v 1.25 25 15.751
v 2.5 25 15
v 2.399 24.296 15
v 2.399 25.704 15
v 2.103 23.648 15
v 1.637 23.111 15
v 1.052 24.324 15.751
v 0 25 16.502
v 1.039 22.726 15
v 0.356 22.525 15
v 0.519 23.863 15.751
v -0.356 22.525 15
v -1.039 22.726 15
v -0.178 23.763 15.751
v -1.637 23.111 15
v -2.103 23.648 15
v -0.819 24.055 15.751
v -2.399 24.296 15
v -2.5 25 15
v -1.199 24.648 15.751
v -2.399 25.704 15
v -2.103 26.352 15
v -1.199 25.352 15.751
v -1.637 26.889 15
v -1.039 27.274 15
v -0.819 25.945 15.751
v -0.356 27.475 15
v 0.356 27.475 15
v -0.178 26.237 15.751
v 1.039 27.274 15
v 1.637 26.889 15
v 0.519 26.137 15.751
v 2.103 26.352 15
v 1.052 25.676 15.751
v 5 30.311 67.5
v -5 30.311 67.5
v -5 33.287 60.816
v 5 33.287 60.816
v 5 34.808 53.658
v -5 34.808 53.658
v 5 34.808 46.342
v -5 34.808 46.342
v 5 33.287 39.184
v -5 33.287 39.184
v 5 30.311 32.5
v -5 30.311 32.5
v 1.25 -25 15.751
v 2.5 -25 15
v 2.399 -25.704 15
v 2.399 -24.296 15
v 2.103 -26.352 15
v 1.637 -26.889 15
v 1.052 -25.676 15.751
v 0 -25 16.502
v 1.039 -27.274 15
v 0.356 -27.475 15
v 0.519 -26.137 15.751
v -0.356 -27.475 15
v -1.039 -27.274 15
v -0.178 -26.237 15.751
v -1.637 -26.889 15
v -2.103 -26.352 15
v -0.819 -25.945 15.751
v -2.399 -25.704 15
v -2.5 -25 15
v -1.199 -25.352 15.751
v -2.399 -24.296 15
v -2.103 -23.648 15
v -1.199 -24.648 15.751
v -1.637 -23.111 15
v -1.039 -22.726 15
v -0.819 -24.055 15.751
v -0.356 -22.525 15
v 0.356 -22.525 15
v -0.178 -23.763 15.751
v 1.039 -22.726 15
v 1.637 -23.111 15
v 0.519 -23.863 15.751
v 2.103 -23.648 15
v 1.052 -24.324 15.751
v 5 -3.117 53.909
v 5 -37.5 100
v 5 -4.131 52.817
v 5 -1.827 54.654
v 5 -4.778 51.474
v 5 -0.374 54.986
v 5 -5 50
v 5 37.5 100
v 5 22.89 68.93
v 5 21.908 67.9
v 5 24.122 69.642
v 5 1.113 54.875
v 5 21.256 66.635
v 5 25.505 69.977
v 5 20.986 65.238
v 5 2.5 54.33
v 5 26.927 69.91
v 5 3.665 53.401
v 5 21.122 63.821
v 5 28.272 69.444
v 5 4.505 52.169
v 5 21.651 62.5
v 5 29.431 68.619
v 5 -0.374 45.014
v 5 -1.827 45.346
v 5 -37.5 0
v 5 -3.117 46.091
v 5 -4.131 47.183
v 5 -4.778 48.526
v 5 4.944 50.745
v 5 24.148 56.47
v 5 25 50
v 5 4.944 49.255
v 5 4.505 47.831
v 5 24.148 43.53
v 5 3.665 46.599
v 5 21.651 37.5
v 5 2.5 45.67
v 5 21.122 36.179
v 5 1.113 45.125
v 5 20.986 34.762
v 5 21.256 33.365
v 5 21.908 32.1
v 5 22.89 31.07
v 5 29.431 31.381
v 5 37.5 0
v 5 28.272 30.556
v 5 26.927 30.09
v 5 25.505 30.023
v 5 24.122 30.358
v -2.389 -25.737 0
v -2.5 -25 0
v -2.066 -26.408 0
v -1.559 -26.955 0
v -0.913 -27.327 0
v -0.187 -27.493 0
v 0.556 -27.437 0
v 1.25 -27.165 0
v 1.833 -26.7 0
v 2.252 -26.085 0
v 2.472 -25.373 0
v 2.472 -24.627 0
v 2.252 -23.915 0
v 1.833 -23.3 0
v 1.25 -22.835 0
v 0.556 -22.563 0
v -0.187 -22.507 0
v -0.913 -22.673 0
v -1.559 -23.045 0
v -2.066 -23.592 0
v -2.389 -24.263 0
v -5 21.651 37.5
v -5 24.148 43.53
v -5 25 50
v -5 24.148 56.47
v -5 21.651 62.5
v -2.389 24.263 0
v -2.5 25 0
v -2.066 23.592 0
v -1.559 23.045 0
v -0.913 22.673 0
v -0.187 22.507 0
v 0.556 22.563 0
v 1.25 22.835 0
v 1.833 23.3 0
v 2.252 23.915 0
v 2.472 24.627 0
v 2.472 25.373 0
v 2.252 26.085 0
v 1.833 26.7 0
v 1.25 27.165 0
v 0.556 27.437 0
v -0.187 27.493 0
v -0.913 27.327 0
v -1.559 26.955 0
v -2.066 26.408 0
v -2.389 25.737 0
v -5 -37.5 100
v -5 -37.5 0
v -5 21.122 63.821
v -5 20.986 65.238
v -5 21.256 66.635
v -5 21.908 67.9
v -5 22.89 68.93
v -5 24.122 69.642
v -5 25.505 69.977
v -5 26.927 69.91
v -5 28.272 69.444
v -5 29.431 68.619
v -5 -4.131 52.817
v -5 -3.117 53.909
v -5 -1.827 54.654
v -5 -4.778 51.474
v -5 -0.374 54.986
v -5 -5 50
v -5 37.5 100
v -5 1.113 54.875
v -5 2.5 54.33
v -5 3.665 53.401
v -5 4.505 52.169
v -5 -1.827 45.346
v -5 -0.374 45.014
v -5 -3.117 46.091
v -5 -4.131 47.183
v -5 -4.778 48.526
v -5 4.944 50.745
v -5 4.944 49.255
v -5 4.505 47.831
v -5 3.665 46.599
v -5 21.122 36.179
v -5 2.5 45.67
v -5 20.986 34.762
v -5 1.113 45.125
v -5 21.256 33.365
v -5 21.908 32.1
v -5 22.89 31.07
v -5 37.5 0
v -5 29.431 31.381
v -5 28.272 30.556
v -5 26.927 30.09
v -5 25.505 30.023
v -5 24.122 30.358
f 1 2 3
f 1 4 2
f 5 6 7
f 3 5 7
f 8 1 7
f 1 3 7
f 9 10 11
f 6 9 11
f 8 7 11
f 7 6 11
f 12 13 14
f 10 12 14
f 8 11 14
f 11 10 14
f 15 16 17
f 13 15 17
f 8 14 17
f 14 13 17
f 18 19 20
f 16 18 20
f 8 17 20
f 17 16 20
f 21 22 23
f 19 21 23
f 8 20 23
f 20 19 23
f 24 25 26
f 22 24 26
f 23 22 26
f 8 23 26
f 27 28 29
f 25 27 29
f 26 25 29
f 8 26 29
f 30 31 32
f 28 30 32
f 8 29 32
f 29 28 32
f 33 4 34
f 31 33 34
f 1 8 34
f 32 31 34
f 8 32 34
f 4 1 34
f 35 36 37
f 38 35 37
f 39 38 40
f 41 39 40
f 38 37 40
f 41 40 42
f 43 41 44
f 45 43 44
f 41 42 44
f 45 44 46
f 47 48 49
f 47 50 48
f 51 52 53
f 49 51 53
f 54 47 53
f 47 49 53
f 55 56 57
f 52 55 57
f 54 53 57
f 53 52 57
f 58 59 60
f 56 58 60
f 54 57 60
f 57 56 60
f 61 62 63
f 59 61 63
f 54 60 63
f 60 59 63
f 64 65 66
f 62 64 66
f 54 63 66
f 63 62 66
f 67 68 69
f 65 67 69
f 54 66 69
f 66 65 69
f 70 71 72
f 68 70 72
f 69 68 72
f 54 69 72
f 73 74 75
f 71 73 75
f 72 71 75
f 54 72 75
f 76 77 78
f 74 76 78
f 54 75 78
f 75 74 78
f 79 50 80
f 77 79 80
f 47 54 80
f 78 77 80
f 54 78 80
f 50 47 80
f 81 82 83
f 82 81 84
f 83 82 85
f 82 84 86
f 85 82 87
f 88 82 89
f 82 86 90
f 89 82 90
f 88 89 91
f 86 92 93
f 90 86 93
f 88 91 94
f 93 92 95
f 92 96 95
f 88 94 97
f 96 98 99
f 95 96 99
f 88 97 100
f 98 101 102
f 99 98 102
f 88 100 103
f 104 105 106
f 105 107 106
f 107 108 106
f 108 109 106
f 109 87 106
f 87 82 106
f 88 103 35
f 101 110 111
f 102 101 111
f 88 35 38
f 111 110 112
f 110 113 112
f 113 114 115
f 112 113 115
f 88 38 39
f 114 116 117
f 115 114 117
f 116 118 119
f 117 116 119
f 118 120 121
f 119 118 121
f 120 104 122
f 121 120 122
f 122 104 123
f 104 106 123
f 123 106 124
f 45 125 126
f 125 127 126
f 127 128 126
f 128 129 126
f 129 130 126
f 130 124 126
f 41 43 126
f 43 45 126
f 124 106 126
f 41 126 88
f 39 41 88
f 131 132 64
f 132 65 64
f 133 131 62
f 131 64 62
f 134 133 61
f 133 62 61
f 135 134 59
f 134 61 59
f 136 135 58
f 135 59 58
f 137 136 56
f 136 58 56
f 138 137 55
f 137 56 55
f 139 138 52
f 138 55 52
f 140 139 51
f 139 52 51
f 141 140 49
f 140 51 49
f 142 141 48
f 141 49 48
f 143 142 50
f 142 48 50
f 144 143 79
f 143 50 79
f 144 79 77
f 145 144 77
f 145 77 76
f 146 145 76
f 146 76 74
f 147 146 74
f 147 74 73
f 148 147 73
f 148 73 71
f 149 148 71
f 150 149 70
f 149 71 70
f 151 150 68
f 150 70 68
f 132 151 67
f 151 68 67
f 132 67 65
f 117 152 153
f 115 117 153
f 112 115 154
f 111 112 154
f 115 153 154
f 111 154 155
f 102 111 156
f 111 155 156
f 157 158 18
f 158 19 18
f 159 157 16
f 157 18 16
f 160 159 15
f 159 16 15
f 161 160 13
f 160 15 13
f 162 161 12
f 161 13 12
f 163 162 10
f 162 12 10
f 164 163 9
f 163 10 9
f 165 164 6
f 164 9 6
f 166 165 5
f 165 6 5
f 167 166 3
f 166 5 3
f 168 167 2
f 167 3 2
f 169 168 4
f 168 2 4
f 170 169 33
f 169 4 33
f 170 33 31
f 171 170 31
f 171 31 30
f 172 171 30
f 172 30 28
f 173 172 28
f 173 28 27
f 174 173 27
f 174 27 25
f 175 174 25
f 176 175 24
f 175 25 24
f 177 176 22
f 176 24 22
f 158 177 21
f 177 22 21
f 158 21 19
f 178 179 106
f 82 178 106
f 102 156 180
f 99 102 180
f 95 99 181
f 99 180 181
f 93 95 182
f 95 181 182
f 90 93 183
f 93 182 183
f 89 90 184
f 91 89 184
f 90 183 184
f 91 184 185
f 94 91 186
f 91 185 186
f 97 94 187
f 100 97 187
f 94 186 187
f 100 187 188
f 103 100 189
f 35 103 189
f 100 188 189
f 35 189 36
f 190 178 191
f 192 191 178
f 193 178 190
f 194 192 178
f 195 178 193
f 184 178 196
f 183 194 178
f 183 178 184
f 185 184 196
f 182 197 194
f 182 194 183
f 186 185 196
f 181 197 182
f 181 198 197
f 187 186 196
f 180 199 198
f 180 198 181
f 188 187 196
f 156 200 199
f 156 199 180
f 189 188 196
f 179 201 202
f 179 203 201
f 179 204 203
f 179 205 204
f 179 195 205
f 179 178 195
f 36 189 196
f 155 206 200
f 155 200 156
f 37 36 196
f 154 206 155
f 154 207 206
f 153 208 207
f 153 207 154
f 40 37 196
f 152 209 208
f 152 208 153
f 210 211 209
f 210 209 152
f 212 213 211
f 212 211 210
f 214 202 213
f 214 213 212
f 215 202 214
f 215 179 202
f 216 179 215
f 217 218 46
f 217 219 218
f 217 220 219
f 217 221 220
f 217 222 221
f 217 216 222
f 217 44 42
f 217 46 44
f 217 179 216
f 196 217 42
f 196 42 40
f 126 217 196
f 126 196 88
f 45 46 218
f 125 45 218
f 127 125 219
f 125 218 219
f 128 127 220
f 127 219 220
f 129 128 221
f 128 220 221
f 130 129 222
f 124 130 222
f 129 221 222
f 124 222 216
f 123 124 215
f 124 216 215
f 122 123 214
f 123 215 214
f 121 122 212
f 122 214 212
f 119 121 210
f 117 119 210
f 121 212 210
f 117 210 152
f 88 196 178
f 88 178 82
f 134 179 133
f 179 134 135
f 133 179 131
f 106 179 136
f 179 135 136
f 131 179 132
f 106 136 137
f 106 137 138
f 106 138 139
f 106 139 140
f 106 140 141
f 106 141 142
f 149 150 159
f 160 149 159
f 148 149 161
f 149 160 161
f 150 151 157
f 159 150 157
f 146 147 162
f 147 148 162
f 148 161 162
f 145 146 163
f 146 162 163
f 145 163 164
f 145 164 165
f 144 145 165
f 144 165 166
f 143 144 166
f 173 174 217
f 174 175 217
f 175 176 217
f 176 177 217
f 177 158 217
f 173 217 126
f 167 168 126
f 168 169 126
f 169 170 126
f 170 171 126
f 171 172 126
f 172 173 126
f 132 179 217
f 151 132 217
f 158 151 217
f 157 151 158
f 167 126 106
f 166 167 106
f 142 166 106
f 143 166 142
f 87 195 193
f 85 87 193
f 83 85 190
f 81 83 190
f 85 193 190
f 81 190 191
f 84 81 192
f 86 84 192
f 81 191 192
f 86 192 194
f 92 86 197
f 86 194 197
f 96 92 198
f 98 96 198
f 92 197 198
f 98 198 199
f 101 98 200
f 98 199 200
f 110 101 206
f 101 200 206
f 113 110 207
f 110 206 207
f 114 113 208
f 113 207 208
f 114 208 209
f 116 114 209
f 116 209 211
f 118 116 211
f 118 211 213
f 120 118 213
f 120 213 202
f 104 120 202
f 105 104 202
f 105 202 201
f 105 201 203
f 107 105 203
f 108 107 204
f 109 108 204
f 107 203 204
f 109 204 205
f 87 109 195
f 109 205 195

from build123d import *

# Parameters (mm, degrees)
F0_W     = 10
F0_H     = 75
F1_DEPTH = 100
F3_D     = 5
F3_DEPTH = 15
F3_TIP   = 1.5021515476
F4_R     = 5
F5_DEPTH = 10
F7_DEPTH = 10


with BuildPart() as f1:
    # F0 (on Top) → F1 (new body)
    with BuildSketch(Plane.XY):
        Rectangle(F0_W, F0_H)
    extrude(amount=F1_DEPTH)

    # F3
    with Locations(Plane(origin=(0, 0, 0), x_dir=(1, 0, 0), z_dir=(0, 0, -1))):
        with Locations((0, 25), (0, -25)):
            Hole(F3_D / 2, depth=F3_DEPTH)
            with Locations((0, 0, -(F3_DEPTH + F3_TIP / 2))):  # 118° drill point
                Cone(0, F3_D / 2, F3_TIP, mode=Mode.SUBTRACT)

    # F4 (on face) → F5 (cut, through all)
    with BuildSketch(Plane(origin=(-5, 0, 0), x_dir=(0, -1, 0), z_dir=(-1, 0, 0))):
        with Locations((0, 50)):
            Circle(F4_R)
    extrude(amount=-F5_DEPTH, mode=Mode.SUBTRACT)

    # F6 (on face) → F7 (cut, through all)
    with BuildSketch(Plane(origin=(-5, 0, 0), x_dir=(0, -1, 0), z_dir=(-1, 0, 0))):
        with BuildLine():
            ThreePointArc((-21.6506350946, 37.5), (-25, 50), (-21.6506350946, 62.5))
            ThreePointArc((-21.6506350946, 62.5), (-23.4807621135, 69.3301270189), (-30.3108891325, 67.5))
            ThreePointArc((-30.3108891325, 67.5), (-35, 50), (-30.3108891325, 32.5))
            ThreePointArc((-30.3108891325, 32.5), (-23.4807621135, 30.6698729811), (-21.6506350946, 37.5))
        make_face()
    extrude(amount=-F7_DEPTH, mode=Mode.SUBTRACT)


solid = f1.part
